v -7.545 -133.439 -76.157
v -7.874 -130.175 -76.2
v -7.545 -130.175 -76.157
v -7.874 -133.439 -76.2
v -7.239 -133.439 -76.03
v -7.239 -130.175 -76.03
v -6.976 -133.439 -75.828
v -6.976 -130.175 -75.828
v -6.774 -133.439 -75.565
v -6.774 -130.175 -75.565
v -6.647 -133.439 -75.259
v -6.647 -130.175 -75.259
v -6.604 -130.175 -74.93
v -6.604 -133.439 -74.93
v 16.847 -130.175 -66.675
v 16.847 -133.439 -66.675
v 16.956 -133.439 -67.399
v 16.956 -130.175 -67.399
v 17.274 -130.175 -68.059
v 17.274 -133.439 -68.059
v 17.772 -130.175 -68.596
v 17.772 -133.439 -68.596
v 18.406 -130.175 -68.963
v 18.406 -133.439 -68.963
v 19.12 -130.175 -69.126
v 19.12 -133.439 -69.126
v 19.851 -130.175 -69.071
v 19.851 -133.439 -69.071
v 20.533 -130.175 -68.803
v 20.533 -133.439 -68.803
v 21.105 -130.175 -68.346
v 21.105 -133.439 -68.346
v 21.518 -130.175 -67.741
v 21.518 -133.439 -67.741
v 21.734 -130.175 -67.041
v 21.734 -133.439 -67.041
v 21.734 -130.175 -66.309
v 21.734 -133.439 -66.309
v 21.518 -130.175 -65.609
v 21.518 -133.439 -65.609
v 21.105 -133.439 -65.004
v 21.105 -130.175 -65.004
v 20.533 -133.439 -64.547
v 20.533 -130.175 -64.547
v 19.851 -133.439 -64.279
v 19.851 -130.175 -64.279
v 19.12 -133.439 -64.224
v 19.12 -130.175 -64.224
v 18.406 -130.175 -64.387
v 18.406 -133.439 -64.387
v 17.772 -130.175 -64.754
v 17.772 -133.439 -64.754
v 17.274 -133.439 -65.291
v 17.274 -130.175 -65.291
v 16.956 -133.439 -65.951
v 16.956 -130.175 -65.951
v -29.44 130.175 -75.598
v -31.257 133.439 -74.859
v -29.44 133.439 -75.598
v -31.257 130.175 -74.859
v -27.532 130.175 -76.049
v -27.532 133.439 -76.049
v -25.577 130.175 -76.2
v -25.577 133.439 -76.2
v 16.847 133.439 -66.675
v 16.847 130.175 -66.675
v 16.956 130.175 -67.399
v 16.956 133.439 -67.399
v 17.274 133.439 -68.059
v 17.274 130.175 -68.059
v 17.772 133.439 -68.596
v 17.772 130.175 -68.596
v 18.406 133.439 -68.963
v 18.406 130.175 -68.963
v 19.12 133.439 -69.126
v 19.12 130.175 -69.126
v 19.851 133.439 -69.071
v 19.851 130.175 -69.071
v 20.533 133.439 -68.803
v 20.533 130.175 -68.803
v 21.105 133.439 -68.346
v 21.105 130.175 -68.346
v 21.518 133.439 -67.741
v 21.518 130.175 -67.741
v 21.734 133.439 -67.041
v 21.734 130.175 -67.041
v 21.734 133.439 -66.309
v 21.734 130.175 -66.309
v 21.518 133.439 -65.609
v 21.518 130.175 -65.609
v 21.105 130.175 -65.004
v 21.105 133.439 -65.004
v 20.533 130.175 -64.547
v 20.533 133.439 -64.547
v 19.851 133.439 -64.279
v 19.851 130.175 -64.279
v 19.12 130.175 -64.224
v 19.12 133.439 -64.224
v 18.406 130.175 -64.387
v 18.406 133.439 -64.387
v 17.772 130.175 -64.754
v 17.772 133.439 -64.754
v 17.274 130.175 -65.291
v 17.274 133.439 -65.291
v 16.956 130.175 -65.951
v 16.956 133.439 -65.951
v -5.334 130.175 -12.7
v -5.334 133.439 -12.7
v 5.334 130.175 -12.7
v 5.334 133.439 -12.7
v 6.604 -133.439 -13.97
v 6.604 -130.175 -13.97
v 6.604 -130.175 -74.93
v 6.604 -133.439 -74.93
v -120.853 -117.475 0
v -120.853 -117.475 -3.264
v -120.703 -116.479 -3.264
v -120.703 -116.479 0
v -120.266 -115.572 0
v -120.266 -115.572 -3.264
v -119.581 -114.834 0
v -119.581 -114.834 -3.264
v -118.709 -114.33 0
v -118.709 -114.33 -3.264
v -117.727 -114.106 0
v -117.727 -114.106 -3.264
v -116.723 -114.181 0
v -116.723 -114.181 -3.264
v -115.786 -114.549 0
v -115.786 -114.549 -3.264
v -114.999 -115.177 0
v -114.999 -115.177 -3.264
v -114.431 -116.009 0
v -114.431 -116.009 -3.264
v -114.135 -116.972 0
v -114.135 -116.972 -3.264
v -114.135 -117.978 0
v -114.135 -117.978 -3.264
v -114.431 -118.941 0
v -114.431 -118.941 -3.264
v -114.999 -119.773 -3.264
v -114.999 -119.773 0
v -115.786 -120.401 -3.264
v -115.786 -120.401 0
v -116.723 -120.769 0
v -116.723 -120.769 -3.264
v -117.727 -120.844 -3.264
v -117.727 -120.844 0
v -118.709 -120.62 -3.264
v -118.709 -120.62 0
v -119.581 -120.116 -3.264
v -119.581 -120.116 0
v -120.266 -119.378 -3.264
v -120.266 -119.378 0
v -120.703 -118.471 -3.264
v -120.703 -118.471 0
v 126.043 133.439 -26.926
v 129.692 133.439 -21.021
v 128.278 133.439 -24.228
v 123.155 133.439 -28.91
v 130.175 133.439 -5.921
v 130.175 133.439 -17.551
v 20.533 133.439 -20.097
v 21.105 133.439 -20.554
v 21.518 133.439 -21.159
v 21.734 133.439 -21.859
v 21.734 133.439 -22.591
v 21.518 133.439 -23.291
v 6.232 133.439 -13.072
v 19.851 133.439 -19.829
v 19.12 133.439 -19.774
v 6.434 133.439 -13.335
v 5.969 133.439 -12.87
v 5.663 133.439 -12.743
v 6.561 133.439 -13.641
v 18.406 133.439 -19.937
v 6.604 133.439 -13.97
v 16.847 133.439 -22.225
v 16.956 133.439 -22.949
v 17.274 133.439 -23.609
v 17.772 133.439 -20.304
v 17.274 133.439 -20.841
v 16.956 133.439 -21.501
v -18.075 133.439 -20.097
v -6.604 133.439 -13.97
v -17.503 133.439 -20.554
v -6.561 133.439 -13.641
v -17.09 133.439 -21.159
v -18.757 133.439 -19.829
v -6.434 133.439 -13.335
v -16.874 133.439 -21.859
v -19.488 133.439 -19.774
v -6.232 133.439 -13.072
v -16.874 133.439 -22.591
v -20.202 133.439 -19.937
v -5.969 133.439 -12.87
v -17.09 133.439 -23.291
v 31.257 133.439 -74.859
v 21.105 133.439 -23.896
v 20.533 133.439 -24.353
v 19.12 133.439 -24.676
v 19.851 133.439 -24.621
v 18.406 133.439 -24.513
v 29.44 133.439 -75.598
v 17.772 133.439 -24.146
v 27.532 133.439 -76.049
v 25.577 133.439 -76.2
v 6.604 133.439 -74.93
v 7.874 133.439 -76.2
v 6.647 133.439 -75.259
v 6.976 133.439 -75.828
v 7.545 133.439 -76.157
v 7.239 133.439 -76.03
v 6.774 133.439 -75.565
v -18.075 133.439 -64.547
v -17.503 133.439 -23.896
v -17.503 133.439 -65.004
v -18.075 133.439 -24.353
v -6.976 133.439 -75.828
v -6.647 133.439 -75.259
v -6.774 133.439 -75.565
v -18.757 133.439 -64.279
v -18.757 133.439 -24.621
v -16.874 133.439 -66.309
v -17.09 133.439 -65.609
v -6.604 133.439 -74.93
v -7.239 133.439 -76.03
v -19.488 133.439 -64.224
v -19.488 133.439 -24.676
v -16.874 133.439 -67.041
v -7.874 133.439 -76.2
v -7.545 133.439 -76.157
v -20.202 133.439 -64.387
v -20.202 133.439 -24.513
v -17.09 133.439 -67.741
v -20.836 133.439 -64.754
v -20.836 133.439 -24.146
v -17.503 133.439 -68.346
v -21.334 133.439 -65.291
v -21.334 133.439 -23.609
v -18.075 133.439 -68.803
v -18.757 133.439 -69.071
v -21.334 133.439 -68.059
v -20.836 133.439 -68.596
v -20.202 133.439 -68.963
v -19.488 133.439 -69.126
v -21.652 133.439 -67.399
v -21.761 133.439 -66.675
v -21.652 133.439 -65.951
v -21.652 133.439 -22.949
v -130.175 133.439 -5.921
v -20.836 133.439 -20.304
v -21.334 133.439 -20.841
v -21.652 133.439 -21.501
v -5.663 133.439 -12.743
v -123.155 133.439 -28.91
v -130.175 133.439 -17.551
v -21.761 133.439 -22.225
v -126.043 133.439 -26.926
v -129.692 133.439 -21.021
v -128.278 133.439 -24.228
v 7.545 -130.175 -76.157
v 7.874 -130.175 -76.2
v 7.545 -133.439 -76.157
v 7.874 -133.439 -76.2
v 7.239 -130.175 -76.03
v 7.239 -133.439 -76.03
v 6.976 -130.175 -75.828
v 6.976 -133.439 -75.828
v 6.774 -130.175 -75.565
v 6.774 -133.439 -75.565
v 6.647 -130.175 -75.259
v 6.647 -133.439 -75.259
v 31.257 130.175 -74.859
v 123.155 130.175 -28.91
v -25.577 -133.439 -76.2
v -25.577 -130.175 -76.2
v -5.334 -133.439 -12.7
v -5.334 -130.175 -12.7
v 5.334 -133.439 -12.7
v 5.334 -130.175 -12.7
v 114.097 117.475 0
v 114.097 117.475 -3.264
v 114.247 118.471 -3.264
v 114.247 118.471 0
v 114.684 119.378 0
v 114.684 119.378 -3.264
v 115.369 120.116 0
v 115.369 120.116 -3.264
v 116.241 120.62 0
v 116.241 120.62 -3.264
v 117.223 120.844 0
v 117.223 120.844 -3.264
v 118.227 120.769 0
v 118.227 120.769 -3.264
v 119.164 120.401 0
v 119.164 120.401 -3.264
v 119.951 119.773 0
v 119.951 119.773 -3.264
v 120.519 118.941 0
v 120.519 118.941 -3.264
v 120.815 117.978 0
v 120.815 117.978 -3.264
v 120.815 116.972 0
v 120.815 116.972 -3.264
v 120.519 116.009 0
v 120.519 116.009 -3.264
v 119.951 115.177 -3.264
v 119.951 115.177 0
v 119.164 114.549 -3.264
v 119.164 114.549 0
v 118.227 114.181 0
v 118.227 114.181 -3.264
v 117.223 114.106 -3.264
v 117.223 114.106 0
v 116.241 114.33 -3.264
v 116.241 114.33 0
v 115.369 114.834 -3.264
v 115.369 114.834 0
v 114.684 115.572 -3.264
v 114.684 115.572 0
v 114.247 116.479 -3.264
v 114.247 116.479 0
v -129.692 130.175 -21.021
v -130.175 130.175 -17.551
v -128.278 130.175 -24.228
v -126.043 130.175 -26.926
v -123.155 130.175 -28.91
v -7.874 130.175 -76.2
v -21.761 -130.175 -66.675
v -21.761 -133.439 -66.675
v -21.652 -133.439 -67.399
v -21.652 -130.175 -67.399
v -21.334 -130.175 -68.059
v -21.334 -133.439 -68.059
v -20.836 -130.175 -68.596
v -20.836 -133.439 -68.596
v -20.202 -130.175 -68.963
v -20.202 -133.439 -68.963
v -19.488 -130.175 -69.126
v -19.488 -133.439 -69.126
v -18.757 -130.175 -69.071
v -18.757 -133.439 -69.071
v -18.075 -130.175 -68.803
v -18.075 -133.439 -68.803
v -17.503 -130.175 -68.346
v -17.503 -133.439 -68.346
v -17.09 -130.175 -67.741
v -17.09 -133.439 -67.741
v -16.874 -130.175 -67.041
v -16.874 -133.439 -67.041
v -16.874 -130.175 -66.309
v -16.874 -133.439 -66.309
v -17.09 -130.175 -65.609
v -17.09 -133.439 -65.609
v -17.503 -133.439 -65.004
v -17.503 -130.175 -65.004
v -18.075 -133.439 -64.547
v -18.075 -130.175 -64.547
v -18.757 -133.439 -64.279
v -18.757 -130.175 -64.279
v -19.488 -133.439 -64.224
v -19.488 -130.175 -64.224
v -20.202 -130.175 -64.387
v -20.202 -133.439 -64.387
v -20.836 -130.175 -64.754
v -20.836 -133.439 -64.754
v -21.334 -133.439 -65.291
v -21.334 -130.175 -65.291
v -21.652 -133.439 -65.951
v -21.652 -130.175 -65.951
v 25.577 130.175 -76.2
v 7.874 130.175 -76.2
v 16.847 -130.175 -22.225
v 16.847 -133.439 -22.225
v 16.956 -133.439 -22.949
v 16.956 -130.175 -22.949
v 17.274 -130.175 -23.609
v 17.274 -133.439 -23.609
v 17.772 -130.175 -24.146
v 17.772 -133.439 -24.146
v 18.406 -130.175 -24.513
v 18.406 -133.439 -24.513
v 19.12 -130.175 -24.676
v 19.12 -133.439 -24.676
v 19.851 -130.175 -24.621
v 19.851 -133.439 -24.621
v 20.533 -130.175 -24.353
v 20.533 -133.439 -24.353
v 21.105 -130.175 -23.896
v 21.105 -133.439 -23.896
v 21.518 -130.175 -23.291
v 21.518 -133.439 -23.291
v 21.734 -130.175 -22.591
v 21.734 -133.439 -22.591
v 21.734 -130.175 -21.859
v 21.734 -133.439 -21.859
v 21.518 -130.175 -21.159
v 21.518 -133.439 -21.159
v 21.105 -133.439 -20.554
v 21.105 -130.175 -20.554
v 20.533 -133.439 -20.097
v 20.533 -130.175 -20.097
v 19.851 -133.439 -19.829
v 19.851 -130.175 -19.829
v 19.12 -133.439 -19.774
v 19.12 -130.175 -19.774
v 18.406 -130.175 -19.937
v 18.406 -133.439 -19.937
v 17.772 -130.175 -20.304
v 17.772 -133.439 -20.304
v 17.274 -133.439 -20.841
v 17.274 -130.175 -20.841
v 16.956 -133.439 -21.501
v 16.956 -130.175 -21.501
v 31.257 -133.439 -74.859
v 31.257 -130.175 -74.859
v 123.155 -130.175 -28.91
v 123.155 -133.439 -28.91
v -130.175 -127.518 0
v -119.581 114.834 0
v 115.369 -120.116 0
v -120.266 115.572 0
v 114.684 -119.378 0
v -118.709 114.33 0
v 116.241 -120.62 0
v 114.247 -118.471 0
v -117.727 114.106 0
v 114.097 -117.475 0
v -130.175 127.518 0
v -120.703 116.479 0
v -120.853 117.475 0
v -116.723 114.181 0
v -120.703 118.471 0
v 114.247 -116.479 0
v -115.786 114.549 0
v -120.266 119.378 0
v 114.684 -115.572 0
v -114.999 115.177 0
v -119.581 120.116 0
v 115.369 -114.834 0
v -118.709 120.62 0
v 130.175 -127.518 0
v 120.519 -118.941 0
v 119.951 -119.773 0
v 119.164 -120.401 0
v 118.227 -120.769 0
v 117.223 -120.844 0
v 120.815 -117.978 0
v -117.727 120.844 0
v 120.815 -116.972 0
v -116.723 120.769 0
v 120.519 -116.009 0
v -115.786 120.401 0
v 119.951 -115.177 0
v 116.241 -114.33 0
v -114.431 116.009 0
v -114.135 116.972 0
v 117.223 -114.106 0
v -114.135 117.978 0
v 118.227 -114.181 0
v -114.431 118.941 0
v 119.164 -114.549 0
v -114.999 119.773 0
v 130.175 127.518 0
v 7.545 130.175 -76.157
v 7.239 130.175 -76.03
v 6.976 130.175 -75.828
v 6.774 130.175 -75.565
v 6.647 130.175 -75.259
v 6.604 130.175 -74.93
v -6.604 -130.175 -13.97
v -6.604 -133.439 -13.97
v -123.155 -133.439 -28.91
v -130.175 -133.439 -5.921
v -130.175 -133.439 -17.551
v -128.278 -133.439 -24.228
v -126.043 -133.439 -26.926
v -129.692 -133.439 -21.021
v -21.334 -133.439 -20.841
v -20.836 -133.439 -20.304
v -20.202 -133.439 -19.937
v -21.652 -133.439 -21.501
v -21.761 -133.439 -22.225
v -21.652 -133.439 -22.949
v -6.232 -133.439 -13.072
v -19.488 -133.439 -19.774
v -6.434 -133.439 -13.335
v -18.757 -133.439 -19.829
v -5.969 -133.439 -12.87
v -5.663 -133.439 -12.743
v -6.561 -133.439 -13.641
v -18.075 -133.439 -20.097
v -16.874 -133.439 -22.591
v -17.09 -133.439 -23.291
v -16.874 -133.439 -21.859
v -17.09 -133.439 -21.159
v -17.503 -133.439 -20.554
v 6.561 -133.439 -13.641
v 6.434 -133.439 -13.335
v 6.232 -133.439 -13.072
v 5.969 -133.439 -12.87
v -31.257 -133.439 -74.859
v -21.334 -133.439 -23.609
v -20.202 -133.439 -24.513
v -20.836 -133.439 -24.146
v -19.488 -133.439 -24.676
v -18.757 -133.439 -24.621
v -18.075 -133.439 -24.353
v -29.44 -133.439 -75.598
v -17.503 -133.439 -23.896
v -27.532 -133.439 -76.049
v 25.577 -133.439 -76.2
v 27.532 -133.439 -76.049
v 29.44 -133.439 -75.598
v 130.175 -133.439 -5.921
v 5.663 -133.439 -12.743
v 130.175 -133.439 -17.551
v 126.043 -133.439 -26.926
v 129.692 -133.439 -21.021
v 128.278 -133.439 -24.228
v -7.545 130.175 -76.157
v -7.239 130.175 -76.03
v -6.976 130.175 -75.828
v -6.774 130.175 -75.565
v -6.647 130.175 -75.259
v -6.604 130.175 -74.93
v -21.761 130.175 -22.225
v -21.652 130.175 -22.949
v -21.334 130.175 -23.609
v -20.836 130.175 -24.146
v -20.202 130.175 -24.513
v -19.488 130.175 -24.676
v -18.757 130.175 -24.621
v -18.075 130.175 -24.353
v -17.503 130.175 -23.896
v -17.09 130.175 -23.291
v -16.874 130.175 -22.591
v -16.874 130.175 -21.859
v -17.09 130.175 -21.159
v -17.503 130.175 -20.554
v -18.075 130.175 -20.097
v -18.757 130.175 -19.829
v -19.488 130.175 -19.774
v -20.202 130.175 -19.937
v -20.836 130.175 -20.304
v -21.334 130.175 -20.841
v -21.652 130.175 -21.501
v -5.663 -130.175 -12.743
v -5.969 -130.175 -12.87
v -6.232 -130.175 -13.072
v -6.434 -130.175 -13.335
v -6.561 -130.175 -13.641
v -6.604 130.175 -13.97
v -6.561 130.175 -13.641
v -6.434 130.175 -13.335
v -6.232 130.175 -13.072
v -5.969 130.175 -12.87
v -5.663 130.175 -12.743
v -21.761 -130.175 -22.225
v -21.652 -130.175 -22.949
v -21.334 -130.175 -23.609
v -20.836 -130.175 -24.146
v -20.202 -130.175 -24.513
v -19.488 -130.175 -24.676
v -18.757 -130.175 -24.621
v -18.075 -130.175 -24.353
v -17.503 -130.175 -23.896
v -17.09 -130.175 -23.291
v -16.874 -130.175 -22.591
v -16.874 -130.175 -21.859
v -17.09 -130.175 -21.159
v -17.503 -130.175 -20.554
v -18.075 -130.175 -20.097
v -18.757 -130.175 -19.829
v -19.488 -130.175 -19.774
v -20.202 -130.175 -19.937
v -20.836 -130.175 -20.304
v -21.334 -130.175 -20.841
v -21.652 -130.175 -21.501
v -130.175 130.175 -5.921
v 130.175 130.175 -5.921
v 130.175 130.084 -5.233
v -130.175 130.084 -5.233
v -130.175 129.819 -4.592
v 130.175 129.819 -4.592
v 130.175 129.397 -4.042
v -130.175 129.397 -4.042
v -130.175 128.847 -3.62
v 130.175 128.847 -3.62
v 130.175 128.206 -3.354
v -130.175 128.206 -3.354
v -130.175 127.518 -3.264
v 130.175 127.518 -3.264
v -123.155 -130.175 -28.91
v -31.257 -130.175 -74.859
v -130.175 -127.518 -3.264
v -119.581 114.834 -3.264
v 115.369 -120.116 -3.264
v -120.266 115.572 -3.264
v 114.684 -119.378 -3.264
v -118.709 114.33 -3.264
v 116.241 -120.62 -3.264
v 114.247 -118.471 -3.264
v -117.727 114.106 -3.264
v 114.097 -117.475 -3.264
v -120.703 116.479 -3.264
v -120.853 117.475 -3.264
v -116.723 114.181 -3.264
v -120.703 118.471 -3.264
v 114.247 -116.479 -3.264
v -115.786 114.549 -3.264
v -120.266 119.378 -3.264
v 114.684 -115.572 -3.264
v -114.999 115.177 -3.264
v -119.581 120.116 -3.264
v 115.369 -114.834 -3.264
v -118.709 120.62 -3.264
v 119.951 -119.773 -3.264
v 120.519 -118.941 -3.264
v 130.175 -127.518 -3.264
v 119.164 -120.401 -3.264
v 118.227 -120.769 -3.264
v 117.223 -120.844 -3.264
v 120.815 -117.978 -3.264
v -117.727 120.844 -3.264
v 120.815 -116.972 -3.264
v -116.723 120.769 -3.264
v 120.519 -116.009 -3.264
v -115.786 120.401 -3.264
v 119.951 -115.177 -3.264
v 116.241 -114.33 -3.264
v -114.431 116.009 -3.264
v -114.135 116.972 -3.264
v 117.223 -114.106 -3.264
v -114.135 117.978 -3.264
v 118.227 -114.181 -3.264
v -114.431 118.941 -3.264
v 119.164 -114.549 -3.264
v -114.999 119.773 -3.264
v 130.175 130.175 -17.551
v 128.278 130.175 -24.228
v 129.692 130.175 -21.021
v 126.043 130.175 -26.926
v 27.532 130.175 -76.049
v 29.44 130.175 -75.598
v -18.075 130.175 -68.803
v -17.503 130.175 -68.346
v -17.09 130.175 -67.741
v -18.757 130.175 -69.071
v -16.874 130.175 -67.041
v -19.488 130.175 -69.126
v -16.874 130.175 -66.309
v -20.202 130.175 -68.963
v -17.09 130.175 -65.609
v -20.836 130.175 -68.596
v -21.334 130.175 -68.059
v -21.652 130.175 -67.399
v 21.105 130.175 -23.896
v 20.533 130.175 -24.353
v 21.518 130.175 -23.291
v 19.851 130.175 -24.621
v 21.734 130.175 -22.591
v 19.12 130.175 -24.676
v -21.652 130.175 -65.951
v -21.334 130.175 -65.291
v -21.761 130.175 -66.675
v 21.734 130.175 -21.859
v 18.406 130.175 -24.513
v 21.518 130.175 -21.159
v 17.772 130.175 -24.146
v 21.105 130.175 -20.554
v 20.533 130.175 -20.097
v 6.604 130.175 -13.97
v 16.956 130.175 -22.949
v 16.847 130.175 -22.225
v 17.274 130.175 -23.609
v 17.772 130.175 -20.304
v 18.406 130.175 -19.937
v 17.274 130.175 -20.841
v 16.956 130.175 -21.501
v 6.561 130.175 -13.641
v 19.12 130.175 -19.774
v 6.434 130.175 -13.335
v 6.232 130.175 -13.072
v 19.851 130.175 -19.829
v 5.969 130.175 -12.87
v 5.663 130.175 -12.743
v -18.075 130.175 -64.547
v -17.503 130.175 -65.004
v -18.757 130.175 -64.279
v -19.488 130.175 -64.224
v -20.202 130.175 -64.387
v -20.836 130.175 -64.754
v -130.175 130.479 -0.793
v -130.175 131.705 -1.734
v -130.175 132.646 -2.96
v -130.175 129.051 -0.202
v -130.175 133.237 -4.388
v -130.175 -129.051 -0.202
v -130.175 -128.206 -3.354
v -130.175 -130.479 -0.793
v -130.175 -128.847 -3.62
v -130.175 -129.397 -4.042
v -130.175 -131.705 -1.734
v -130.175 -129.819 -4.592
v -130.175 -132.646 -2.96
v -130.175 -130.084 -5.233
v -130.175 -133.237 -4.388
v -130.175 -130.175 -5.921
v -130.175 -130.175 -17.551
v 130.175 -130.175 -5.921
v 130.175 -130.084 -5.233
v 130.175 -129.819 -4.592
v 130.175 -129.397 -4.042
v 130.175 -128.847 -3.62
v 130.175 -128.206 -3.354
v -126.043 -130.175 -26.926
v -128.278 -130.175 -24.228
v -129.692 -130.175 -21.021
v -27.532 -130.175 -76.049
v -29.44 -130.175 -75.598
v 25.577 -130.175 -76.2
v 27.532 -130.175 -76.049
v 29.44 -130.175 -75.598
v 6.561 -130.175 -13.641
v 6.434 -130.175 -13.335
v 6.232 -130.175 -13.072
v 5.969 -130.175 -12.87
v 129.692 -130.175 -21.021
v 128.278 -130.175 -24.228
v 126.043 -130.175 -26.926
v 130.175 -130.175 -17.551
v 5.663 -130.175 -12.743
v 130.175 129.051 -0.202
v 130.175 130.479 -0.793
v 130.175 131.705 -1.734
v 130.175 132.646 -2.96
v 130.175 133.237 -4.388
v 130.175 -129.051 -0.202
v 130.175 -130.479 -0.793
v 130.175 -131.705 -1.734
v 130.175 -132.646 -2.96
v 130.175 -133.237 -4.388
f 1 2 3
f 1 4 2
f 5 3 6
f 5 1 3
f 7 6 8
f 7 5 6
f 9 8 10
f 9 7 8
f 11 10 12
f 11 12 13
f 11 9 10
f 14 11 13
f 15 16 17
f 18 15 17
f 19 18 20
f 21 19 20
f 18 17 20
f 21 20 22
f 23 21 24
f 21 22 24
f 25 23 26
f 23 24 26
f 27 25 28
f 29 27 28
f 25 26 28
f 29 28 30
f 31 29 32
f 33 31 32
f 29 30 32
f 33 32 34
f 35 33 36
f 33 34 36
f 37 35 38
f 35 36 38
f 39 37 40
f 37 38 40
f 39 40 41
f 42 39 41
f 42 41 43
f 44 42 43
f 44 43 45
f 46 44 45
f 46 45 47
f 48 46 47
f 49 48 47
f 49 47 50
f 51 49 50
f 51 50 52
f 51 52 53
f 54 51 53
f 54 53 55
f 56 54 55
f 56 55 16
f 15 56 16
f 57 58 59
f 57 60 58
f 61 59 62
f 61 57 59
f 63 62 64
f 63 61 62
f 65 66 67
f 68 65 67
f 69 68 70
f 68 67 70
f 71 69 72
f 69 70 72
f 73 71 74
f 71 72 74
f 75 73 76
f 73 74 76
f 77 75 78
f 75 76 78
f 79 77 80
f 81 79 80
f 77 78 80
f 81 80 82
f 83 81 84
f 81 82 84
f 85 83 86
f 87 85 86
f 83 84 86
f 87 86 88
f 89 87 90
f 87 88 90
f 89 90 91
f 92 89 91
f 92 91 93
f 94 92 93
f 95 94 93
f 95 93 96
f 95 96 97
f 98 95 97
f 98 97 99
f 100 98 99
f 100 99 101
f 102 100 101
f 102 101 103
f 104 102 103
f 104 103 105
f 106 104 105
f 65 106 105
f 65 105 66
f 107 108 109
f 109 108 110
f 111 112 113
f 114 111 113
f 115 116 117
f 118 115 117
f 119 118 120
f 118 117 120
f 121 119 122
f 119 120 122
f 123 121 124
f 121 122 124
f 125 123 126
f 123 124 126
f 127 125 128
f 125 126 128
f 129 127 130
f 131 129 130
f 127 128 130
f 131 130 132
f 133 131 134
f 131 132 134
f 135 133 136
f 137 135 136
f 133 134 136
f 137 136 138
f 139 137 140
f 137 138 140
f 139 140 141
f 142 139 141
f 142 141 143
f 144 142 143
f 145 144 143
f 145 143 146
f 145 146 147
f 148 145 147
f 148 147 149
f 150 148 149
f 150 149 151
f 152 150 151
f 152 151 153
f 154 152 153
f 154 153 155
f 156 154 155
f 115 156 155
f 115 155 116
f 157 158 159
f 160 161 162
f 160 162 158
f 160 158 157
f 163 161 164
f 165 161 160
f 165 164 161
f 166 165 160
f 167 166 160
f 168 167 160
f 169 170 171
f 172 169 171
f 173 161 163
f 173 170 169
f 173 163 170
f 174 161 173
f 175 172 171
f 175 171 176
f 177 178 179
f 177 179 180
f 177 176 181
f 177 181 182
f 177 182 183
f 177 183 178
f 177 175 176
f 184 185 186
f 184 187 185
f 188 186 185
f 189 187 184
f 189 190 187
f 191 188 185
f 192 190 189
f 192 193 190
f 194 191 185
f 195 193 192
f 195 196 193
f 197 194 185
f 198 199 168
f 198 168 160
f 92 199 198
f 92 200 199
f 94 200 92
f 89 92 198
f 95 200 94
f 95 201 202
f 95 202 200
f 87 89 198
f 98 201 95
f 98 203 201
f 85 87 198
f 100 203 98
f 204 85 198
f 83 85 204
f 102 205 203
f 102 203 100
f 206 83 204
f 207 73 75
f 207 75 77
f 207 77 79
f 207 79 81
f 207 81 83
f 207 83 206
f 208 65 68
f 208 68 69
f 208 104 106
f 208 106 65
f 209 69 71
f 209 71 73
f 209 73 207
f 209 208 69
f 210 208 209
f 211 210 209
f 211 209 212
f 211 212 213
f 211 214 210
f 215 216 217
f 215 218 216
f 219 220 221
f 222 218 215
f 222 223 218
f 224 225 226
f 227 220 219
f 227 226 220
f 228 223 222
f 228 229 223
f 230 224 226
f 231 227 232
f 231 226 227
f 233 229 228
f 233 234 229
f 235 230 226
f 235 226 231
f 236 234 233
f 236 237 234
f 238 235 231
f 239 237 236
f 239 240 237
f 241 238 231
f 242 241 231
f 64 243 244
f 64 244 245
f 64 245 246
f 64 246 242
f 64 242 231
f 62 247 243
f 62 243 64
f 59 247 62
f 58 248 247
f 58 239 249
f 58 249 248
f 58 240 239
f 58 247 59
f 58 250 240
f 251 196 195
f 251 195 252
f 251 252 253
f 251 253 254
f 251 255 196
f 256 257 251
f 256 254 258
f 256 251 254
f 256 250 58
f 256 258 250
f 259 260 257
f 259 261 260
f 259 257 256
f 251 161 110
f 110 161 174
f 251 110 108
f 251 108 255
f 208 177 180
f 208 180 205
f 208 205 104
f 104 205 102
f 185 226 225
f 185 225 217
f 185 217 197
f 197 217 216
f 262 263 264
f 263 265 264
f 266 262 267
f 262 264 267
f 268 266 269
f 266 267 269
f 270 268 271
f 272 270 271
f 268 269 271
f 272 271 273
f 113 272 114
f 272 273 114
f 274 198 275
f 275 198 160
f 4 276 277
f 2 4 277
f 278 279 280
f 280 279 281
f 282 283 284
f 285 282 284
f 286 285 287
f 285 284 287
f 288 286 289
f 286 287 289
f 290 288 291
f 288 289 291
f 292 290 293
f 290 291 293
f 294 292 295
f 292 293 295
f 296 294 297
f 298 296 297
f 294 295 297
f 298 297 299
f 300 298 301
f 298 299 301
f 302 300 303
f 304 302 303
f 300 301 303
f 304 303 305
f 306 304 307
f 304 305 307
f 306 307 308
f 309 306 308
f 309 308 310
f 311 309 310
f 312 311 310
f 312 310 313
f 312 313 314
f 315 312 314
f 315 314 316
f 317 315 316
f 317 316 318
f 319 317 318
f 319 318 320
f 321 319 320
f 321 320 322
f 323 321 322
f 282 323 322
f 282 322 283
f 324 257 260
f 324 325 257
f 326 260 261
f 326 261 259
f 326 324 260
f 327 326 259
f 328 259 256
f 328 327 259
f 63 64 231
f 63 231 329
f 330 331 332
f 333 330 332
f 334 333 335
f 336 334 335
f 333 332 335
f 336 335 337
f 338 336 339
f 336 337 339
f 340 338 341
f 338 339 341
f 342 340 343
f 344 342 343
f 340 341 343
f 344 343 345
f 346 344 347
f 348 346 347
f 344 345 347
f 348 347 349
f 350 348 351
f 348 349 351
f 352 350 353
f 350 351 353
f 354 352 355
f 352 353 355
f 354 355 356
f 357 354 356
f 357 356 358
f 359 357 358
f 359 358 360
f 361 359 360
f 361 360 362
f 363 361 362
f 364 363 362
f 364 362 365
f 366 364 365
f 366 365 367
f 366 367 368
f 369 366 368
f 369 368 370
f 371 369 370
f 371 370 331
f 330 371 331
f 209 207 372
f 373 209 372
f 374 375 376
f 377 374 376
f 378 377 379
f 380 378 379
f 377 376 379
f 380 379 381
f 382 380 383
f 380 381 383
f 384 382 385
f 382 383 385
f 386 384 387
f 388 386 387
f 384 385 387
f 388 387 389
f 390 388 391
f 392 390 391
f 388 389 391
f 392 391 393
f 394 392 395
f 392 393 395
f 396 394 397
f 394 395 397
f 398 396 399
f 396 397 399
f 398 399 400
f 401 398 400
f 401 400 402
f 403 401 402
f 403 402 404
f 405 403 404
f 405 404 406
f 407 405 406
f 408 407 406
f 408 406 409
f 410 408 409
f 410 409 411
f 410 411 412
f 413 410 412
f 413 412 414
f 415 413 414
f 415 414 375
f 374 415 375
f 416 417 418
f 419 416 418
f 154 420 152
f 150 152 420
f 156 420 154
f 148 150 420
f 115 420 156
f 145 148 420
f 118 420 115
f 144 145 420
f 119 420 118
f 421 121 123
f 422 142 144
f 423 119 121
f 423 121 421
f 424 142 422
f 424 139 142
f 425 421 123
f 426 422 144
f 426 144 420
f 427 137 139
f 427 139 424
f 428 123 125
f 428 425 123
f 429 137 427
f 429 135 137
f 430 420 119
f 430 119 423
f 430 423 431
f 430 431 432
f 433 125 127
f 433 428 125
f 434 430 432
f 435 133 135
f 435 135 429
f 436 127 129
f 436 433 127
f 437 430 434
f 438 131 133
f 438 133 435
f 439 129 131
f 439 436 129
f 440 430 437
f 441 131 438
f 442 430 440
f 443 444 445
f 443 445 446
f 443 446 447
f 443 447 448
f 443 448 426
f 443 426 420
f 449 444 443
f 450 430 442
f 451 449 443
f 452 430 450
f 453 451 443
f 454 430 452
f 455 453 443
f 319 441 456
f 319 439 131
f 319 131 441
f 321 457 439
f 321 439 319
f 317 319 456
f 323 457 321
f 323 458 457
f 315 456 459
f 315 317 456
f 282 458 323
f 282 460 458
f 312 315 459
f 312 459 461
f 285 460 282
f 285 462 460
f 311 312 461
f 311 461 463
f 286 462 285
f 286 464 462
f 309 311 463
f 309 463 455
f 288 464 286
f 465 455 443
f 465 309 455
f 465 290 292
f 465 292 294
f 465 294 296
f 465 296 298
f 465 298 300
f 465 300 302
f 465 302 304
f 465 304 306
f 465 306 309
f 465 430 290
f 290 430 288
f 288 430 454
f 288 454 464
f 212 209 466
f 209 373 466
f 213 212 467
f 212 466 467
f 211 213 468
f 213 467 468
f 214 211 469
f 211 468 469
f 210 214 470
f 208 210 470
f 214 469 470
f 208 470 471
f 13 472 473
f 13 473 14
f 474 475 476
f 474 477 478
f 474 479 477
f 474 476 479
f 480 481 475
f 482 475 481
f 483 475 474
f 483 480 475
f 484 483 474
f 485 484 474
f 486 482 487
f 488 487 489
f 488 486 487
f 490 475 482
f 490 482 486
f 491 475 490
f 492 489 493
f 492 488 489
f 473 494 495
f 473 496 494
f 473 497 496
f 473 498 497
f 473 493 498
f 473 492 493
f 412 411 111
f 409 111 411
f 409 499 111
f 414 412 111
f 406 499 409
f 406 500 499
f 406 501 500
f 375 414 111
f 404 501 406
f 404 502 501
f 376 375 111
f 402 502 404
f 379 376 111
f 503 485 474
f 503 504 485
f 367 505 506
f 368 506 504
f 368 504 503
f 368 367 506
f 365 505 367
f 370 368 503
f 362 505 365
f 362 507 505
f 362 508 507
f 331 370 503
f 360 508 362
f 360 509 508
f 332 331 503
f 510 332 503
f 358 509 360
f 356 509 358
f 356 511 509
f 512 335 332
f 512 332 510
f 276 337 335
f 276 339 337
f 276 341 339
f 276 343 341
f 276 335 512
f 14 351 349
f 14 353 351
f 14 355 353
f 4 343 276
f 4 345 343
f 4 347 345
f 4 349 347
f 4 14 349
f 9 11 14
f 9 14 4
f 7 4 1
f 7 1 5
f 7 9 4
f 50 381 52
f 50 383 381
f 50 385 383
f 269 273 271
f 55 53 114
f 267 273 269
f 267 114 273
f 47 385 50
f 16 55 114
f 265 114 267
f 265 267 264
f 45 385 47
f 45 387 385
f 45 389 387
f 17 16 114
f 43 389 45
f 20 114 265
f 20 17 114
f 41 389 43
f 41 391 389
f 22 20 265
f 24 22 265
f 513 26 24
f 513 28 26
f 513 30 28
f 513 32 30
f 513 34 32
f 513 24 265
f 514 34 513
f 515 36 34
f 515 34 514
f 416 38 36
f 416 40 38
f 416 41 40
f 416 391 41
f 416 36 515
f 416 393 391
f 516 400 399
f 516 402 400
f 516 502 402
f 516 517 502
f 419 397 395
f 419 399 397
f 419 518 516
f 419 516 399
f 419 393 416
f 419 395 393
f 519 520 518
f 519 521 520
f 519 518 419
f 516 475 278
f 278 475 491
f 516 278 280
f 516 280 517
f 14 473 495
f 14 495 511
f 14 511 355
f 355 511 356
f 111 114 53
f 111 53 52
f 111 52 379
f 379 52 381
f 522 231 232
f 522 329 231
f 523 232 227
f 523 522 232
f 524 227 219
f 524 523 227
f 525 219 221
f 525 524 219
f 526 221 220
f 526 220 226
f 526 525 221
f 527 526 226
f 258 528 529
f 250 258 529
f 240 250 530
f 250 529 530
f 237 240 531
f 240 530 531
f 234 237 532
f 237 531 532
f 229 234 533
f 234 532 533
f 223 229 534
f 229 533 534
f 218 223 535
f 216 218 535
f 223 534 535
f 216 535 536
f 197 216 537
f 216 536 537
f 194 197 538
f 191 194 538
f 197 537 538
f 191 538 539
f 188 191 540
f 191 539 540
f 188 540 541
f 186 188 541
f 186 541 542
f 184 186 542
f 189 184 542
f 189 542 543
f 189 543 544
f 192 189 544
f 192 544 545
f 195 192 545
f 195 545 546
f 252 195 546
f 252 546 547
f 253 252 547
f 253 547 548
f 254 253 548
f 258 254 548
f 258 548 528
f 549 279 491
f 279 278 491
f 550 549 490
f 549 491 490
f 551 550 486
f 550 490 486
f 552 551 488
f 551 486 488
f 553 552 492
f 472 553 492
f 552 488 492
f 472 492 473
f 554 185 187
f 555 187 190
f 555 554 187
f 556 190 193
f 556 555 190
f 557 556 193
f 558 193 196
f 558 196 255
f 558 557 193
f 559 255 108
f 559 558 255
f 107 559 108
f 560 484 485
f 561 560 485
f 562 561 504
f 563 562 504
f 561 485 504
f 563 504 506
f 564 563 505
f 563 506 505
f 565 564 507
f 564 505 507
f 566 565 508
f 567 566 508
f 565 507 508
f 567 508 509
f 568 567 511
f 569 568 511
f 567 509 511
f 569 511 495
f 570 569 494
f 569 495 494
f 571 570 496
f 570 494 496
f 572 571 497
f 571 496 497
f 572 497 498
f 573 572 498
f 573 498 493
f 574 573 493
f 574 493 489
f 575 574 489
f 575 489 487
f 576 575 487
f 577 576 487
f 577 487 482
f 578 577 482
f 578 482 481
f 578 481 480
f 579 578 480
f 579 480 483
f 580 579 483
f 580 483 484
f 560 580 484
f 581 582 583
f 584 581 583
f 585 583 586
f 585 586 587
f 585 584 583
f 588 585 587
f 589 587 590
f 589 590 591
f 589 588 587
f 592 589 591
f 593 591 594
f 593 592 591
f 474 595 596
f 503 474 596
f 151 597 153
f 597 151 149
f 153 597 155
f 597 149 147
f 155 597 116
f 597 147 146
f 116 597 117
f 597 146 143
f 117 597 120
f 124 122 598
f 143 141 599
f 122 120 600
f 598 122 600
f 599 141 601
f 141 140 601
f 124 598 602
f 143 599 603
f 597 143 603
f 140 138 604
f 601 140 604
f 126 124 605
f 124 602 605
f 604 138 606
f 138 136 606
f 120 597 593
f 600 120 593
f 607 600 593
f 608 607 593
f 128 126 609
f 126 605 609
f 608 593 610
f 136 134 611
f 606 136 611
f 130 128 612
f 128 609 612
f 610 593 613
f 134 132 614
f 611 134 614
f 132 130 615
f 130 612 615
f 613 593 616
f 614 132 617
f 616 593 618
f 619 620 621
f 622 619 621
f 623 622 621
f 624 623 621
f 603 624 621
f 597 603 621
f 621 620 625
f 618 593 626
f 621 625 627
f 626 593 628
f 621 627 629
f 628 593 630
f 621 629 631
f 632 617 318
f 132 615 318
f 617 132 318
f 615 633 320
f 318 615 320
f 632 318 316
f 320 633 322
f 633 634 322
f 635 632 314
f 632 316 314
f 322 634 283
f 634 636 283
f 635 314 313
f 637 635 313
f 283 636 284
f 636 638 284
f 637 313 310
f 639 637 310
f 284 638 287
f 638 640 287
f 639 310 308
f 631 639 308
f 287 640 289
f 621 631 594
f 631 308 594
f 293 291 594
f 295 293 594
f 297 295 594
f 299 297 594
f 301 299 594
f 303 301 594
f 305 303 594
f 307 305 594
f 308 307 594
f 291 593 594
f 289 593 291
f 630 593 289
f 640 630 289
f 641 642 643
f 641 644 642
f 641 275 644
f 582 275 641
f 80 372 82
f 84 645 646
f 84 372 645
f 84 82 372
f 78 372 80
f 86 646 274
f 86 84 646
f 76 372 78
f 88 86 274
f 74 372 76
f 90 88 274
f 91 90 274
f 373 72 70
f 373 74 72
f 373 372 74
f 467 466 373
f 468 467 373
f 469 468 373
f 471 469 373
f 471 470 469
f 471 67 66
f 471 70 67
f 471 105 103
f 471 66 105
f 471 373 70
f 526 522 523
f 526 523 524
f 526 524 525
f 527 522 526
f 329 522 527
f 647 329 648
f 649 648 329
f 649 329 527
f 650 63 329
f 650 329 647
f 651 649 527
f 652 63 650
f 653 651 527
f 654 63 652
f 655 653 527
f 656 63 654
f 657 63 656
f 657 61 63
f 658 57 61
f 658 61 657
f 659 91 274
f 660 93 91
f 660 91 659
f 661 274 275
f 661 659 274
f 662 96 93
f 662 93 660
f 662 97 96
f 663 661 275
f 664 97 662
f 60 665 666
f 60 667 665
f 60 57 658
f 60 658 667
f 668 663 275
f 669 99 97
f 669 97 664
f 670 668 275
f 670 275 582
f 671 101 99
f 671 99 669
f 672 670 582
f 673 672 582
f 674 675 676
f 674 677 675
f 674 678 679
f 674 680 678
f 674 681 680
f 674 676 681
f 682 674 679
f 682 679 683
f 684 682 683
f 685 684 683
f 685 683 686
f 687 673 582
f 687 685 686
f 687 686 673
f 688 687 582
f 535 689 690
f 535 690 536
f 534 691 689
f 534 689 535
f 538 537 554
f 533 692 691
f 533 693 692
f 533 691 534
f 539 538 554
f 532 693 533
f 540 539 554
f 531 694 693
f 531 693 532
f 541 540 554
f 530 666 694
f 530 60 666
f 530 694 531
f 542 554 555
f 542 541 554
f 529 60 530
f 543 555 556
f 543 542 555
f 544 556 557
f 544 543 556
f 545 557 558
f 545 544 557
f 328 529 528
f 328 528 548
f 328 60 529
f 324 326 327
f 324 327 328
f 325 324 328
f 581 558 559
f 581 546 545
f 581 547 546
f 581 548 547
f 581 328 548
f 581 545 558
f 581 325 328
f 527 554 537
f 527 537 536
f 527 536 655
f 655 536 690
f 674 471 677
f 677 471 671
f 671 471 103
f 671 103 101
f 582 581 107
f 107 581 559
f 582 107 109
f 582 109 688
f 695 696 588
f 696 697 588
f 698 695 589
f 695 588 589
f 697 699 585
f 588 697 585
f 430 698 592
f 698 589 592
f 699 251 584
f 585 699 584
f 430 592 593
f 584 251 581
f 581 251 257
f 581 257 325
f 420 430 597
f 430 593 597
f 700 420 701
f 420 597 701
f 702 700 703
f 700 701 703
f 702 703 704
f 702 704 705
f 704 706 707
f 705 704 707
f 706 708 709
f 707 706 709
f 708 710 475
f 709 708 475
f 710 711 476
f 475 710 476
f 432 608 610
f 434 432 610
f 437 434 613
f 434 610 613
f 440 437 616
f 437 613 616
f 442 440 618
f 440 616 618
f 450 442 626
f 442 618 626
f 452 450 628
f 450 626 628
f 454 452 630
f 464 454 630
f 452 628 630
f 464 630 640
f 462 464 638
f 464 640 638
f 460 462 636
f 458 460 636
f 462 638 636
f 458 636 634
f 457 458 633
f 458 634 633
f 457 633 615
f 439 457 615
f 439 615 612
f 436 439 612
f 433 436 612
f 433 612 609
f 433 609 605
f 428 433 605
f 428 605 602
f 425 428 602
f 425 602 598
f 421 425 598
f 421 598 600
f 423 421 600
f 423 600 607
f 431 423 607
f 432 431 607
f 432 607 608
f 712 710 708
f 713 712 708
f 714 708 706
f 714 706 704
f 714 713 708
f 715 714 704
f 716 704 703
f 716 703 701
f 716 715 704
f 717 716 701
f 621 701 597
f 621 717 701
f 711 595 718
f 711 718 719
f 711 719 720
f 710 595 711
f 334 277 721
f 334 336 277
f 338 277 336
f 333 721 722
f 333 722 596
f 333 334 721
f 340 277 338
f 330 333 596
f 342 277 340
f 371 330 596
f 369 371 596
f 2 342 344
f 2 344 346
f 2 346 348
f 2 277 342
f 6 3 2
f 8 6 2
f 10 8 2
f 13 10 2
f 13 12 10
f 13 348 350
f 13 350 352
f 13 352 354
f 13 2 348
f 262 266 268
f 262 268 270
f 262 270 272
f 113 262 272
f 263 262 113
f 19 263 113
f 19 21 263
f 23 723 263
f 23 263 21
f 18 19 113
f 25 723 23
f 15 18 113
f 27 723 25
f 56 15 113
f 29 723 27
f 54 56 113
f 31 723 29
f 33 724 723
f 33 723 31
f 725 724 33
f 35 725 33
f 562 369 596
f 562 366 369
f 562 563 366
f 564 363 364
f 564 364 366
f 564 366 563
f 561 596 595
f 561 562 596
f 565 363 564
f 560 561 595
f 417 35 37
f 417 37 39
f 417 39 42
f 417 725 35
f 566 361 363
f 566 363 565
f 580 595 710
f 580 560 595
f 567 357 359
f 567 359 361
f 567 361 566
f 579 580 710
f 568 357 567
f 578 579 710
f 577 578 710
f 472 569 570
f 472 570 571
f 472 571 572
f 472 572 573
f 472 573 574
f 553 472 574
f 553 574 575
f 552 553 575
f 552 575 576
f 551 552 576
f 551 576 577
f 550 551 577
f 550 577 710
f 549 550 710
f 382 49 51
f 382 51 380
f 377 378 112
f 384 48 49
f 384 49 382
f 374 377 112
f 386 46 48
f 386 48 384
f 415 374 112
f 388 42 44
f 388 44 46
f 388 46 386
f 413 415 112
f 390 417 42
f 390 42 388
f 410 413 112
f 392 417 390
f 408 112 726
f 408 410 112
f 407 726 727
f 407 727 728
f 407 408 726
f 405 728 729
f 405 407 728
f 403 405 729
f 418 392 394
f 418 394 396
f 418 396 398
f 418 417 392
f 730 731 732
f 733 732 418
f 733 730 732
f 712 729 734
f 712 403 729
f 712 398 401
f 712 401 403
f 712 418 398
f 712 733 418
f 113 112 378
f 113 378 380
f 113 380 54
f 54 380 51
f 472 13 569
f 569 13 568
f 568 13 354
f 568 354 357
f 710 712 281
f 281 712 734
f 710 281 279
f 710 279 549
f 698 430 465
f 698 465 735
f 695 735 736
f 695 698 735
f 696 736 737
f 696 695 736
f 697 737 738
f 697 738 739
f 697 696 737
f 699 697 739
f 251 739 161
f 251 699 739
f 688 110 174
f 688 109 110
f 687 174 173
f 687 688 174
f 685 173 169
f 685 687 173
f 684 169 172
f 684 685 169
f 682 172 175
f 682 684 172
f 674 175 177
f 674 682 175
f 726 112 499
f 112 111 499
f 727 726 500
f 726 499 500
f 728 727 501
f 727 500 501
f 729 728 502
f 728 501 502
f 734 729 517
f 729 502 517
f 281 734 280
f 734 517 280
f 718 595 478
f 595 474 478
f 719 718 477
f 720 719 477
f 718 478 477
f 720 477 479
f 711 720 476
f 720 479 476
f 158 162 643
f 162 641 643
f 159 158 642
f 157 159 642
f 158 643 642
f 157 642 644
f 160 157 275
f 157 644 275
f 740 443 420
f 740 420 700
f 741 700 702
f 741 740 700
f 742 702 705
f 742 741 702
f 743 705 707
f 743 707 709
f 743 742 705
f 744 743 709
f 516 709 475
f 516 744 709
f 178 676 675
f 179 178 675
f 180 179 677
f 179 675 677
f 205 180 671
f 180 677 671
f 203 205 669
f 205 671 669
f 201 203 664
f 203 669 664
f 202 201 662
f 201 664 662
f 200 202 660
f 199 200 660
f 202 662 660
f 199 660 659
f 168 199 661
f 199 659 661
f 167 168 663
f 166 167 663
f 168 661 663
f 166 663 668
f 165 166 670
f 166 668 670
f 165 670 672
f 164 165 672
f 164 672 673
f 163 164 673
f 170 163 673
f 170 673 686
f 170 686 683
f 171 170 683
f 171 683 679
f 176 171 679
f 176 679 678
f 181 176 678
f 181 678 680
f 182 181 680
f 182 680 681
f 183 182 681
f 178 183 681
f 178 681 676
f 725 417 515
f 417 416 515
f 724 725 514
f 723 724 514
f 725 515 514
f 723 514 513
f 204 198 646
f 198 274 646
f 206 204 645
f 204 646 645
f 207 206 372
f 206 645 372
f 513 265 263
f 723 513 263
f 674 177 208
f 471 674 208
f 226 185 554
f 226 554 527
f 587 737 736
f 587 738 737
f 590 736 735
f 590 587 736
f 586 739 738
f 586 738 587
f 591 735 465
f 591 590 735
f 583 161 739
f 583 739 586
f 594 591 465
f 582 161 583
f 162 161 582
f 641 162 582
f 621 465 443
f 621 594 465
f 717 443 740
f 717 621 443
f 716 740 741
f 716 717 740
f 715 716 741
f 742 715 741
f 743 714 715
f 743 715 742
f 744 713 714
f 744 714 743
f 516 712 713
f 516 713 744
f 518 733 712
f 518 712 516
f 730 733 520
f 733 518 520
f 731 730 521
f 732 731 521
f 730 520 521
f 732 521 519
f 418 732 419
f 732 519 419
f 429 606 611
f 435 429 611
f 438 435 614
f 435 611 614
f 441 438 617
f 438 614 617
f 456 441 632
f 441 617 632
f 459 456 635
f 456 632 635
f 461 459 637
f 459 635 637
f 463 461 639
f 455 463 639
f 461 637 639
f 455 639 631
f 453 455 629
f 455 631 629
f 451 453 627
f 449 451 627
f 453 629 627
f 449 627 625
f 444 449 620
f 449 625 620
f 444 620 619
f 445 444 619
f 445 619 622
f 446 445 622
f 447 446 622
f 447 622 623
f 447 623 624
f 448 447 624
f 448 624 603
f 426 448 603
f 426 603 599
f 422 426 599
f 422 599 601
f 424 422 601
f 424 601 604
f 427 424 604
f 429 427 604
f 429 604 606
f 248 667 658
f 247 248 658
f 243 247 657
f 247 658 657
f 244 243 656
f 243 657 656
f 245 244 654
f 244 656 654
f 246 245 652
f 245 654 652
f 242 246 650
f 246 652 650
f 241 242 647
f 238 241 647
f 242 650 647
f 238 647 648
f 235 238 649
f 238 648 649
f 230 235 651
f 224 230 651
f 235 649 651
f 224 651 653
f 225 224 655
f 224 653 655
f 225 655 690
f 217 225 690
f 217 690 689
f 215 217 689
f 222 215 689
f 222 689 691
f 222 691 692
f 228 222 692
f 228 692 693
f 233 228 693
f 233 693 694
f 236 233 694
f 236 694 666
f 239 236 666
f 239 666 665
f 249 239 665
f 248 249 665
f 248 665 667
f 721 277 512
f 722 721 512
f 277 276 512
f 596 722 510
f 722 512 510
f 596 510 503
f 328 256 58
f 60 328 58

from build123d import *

# Parameters (mm, degrees)
SKETCH1_W                      = 260.35
SKETCH1_H                      = 260.35
BASE_FLANGE1_DEPTH             = 3.2639
EDGE_FLANGE1_STRIP_W           = 18.36928
EDGE_FLANGE1_STRIP_H           = 3.2639
EDGE_FLANGE1_STRIP_CUT_DEPTH   = 260.35
EDGE_FLANGE1_STRIP_2_W         = 18.36928
EDGE_FLANGE1_STRIP_2_H         = 3.2639
EDGE_FLANGE1_STRIP_CUT_2_DEPTH = 260.35
EDGE_FLANGE1_DEPTH             = 260.35
EDGE_FLANGE1_BEND_DEPTH        = 260.35
SKETCH16_W                     = 13.208
SKETCH16_H                     = 63.5
CUT_EXTRUDE1_DEPTH             = 307.55461301
CUT_EXTRUDE2_DEPTH             = 307.55461301
FILLET1_R                      = 12.7
F_10_0_1935_DIAMETER_HOLE1_D   = 4.9149
FILLET2_R                      = 1.27
F_1_4_CLEARANCE_HOLE1_D        = 6.7564


# Sheet-metal steps are written as plain solids
with BuildPart() as part:
    # Sketch1 → Base-Flange1 (new body)
    with BuildSketch(Plane.XY):
        Rectangle(SKETCH1_W, SKETCH1_H)
    extrude(amount=-BASE_FLANGE1_DEPTH)

    # Edge-Flange1 strip (across the edge) → Edge-Flange1 strip cut (cut)
    with BuildSketch(Plane(origin=(-130.175, 130.175, -3.2639), x_dir=(0, -1, 0), z_dir=(1, 0, 0))):
        with Locations((-6.5278, -1.63195)):
            Rectangle(EDGE_FLANGE1_STRIP_W, EDGE_FLANGE1_STRIP_H)
    extrude(amount=EDGE_FLANGE1_STRIP_CUT_DEPTH, mode=Mode.SUBTRACT)

    # Edge-Flange1 strip 2 (across the edge) → Edge-Flange1 strip cut 2 (cut)
    with BuildSketch(Plane(origin=(130.175, -130.175, -3.2639), x_dir=(0, 1, 0), z_dir=(-1, 0, 0))):
        with Locations((-6.5278, -1.63195)):
            Rectangle(EDGE_FLANGE1_STRIP_2_W, EDGE_FLANGE1_STRIP_2_H)
    extrude(amount=EDGE_FLANGE1_STRIP_CUT_2_DEPTH, mode=Mode.SUBTRACT)

    # Edge-Flange1 section (across the edge) → Edge-Flange1 (add)
    with BuildSketch(Plane(origin=(-130.175, 130.175, -3.2639), x_dir=(0, -1, 0), z_dir=(1, 0, 0))):
        with BuildLine():
            Line((-3.2639, 2.65684), (-3.2639, 72.9361))
            Line((-3.2639, 72.9361), (0, 72.9361))
            Line((0, 72.9361), (0, 2.65684))
            ThreePointArc((0, 2.65684), (0.778170419, 0.778170419), (2.65684, 0))
            Line((2.65684, 0), (2.65684, -3.2639))
            ThreePointArc((2.65684, -3.2639), (-1.529755404, -1.529755404), (-3.2639, 2.65684))
        make_face()
    extrude(amount=EDGE_FLANGE1_DEPTH)

    # Edge-Flange1 section 2 (across the edge) → Edge-Flange1 bend (add)
    with BuildSketch(Plane(origin=(130.175, -130.175, -3.2639), x_dir=(0, 1, 0), z_dir=(-1, 0, 0))):
        with BuildLine():
            Line((-3.2639, 2.65684), (-3.2639, 72.9361))
            Line((-3.2639, 72.9361), (0, 72.9361))
            Line((0, 72.9361), (0, 2.65684))
            ThreePointArc((0, 2.65684), (0.778170419, 0.778170419), (2.65684, 0))
            Line((2.65684, 0), (2.65684, -3.2639))
            ThreePointArc((2.65684, -3.2639), (-1.529755404, -1.529755404), (-3.2639, 2.65684))
        make_face()
    extrude(amount=EDGE_FLANGE1_BEND_DEPTH)

    # Sketch16 → Cut-Extrude1 (cut, through all)
    with BuildSketch(Plane(origin=(0, 133.4389, 0), x_dir=(1, 0, 0), z_dir=(0, 1, 0))):
        with Locations((0, 44.45)):
            Rectangle(SKETCH16_W, SKETCH16_H)
    extrude(amount=-CUT_EXTRUDE1_DEPTH, mode=Mode.SUBTRACT)

    # Sketch18 → Cut-Extrude2 (cut, through all)
    with BuildSketch(Plane(origin=(0, 133.4389, 0), x_dir=(1, 0, 0), z_dir=(0, 1, 0))):
        Polygon((-130.175, 76.2), (-130.175, 25.4), (-28.575, 76.2), align=None)
        Polygon((130.175, 76.2), (28.575, 76.2), (130.175, 25.4), align=None)
    extrude(amount=-CUT_EXTRUDE2_DEPTH, mode=Mode.SUBTRACT)

    # Fillet1
    fillet1_edges = [part.edges().sort_by_distance(p)[0] for p in [
        (-28.575, 131.80695, -76.2),
        (-130.175, 131.80695, -25.4),
        (-28.575, -131.80695, -76.2),
        (-130.175, -131.80695, -25.4),
        (28.575, 131.80695, -76.2),
        (130.175, 131.80695, -25.4),
        (130.175, -131.80695, -25.4),
        (28.575, -131.80695, -76.2),
    ]]
    fillet(fillet1_edges, radius=FILLET1_R)

    # #10 (0.1935) Diameter Hole1 (through all)
    with Locations(Plane(origin=(0, 133.4389, 0), x_dir=(1, 0, 0), z_dir=(0, 1, 0))):
        with Locations((-19.304, 22.225), (-19.304, 66.675), (19.304, 66.675), (19.304, 22.225)):
            Hole(F_10_0_1935_DIAMETER_HOLE1_D / 2)

    # Fillet2
    fillet2_edges = [part.edges().sort_by_distance(p)[0] for p in [
        (-6.604, 131.80695, -76.2),
        (6.604, 131.80695, -12.7),
        (-6.604, 131.80695, -12.7),
        (6.604, 131.80695, -76.2),
        (-6.604, -131.80695, -12.7),
        (-6.604, -131.80695, -76.2),
        (6.604, -131.80695, -76.2),
        (6.604, -131.80695, -12.7),
    ]]
    fillet(fillet2_edges, radius=FILLET2_R)

    # 1/4 Clearance Hole1 (through all)
    with Locations(Plane.XY):
        with Locations((117.475, 117.475), (-117.475, -117.475), (-117.475, 117.475), (117.475, -117.475)):
            Hole(F_1_4_CLEARANCE_HOLE1_D / 2)


solid = part.part
